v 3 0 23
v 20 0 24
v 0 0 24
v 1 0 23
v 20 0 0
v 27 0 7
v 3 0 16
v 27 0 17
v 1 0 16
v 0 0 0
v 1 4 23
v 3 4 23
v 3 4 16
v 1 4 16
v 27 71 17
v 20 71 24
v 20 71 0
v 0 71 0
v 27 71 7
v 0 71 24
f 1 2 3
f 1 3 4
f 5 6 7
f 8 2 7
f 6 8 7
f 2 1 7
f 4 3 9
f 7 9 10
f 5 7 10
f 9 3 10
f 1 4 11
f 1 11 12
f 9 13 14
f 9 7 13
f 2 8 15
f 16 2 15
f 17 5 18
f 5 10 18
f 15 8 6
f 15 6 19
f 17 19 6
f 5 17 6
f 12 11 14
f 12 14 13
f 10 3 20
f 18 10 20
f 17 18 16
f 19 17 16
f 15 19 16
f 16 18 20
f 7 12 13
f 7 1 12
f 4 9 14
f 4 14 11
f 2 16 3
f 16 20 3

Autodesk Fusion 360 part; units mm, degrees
sketch "Sketch1" plane through (0, 0, 0) normal (1, 0, 0) x (0, 1, 0) in component "RobotisBatt"
  line L0 (0, 0) -> (71, 0)
  line L1 (71, 0) -> (71, 24)
  line L2 (71, 24) -> (0, 24)
  line L3 (0, 24) -> (0, 0)
  dimension "d1" = 71
  dimension "d2" = 24
extrude "Extrude1" add sketch "Sketch1" along normal blind 27 in component "RobotisBatt"
chamfer "Chamfer1" distance 7 angle 45 2 edges at (27, 35.5, 24) (27, 35.5, 0) in component "RobotisBatt"
sketch "Sketch2" plane through (0, 0, 0) normal (0, -1, 0) x (1, 0, 0) in component "RobotisBatt"
  line L0 (20, 0) -> (27, 7)
  line L1 (27, 7) -> (27, 17)
  line L2 (27, 17) -> (20, 24)
  line L3 (20, 24) -> (0, 24)
  line L4 (0, 24) -> (0, 0)
  line L5 (0, 0) -> (20, 0)
  line L6 (1, 23) -> (3, 23)
  line L7 (3, 23) -> (3, 16)
  line L8 (3, 16) -> (1, 16)
  line L9 (1, 16) -> (1, 23)
extrude "Extrude2" cut sketch "Sketch2" against normal blind 4 contours L6 L7 L8 L9 in component "RobotisBatt"
component "RobotisBatt" placed x (1, 0, 0) y (0, 1, 0) z (0, 0, 1) at (0, 0, 0)
